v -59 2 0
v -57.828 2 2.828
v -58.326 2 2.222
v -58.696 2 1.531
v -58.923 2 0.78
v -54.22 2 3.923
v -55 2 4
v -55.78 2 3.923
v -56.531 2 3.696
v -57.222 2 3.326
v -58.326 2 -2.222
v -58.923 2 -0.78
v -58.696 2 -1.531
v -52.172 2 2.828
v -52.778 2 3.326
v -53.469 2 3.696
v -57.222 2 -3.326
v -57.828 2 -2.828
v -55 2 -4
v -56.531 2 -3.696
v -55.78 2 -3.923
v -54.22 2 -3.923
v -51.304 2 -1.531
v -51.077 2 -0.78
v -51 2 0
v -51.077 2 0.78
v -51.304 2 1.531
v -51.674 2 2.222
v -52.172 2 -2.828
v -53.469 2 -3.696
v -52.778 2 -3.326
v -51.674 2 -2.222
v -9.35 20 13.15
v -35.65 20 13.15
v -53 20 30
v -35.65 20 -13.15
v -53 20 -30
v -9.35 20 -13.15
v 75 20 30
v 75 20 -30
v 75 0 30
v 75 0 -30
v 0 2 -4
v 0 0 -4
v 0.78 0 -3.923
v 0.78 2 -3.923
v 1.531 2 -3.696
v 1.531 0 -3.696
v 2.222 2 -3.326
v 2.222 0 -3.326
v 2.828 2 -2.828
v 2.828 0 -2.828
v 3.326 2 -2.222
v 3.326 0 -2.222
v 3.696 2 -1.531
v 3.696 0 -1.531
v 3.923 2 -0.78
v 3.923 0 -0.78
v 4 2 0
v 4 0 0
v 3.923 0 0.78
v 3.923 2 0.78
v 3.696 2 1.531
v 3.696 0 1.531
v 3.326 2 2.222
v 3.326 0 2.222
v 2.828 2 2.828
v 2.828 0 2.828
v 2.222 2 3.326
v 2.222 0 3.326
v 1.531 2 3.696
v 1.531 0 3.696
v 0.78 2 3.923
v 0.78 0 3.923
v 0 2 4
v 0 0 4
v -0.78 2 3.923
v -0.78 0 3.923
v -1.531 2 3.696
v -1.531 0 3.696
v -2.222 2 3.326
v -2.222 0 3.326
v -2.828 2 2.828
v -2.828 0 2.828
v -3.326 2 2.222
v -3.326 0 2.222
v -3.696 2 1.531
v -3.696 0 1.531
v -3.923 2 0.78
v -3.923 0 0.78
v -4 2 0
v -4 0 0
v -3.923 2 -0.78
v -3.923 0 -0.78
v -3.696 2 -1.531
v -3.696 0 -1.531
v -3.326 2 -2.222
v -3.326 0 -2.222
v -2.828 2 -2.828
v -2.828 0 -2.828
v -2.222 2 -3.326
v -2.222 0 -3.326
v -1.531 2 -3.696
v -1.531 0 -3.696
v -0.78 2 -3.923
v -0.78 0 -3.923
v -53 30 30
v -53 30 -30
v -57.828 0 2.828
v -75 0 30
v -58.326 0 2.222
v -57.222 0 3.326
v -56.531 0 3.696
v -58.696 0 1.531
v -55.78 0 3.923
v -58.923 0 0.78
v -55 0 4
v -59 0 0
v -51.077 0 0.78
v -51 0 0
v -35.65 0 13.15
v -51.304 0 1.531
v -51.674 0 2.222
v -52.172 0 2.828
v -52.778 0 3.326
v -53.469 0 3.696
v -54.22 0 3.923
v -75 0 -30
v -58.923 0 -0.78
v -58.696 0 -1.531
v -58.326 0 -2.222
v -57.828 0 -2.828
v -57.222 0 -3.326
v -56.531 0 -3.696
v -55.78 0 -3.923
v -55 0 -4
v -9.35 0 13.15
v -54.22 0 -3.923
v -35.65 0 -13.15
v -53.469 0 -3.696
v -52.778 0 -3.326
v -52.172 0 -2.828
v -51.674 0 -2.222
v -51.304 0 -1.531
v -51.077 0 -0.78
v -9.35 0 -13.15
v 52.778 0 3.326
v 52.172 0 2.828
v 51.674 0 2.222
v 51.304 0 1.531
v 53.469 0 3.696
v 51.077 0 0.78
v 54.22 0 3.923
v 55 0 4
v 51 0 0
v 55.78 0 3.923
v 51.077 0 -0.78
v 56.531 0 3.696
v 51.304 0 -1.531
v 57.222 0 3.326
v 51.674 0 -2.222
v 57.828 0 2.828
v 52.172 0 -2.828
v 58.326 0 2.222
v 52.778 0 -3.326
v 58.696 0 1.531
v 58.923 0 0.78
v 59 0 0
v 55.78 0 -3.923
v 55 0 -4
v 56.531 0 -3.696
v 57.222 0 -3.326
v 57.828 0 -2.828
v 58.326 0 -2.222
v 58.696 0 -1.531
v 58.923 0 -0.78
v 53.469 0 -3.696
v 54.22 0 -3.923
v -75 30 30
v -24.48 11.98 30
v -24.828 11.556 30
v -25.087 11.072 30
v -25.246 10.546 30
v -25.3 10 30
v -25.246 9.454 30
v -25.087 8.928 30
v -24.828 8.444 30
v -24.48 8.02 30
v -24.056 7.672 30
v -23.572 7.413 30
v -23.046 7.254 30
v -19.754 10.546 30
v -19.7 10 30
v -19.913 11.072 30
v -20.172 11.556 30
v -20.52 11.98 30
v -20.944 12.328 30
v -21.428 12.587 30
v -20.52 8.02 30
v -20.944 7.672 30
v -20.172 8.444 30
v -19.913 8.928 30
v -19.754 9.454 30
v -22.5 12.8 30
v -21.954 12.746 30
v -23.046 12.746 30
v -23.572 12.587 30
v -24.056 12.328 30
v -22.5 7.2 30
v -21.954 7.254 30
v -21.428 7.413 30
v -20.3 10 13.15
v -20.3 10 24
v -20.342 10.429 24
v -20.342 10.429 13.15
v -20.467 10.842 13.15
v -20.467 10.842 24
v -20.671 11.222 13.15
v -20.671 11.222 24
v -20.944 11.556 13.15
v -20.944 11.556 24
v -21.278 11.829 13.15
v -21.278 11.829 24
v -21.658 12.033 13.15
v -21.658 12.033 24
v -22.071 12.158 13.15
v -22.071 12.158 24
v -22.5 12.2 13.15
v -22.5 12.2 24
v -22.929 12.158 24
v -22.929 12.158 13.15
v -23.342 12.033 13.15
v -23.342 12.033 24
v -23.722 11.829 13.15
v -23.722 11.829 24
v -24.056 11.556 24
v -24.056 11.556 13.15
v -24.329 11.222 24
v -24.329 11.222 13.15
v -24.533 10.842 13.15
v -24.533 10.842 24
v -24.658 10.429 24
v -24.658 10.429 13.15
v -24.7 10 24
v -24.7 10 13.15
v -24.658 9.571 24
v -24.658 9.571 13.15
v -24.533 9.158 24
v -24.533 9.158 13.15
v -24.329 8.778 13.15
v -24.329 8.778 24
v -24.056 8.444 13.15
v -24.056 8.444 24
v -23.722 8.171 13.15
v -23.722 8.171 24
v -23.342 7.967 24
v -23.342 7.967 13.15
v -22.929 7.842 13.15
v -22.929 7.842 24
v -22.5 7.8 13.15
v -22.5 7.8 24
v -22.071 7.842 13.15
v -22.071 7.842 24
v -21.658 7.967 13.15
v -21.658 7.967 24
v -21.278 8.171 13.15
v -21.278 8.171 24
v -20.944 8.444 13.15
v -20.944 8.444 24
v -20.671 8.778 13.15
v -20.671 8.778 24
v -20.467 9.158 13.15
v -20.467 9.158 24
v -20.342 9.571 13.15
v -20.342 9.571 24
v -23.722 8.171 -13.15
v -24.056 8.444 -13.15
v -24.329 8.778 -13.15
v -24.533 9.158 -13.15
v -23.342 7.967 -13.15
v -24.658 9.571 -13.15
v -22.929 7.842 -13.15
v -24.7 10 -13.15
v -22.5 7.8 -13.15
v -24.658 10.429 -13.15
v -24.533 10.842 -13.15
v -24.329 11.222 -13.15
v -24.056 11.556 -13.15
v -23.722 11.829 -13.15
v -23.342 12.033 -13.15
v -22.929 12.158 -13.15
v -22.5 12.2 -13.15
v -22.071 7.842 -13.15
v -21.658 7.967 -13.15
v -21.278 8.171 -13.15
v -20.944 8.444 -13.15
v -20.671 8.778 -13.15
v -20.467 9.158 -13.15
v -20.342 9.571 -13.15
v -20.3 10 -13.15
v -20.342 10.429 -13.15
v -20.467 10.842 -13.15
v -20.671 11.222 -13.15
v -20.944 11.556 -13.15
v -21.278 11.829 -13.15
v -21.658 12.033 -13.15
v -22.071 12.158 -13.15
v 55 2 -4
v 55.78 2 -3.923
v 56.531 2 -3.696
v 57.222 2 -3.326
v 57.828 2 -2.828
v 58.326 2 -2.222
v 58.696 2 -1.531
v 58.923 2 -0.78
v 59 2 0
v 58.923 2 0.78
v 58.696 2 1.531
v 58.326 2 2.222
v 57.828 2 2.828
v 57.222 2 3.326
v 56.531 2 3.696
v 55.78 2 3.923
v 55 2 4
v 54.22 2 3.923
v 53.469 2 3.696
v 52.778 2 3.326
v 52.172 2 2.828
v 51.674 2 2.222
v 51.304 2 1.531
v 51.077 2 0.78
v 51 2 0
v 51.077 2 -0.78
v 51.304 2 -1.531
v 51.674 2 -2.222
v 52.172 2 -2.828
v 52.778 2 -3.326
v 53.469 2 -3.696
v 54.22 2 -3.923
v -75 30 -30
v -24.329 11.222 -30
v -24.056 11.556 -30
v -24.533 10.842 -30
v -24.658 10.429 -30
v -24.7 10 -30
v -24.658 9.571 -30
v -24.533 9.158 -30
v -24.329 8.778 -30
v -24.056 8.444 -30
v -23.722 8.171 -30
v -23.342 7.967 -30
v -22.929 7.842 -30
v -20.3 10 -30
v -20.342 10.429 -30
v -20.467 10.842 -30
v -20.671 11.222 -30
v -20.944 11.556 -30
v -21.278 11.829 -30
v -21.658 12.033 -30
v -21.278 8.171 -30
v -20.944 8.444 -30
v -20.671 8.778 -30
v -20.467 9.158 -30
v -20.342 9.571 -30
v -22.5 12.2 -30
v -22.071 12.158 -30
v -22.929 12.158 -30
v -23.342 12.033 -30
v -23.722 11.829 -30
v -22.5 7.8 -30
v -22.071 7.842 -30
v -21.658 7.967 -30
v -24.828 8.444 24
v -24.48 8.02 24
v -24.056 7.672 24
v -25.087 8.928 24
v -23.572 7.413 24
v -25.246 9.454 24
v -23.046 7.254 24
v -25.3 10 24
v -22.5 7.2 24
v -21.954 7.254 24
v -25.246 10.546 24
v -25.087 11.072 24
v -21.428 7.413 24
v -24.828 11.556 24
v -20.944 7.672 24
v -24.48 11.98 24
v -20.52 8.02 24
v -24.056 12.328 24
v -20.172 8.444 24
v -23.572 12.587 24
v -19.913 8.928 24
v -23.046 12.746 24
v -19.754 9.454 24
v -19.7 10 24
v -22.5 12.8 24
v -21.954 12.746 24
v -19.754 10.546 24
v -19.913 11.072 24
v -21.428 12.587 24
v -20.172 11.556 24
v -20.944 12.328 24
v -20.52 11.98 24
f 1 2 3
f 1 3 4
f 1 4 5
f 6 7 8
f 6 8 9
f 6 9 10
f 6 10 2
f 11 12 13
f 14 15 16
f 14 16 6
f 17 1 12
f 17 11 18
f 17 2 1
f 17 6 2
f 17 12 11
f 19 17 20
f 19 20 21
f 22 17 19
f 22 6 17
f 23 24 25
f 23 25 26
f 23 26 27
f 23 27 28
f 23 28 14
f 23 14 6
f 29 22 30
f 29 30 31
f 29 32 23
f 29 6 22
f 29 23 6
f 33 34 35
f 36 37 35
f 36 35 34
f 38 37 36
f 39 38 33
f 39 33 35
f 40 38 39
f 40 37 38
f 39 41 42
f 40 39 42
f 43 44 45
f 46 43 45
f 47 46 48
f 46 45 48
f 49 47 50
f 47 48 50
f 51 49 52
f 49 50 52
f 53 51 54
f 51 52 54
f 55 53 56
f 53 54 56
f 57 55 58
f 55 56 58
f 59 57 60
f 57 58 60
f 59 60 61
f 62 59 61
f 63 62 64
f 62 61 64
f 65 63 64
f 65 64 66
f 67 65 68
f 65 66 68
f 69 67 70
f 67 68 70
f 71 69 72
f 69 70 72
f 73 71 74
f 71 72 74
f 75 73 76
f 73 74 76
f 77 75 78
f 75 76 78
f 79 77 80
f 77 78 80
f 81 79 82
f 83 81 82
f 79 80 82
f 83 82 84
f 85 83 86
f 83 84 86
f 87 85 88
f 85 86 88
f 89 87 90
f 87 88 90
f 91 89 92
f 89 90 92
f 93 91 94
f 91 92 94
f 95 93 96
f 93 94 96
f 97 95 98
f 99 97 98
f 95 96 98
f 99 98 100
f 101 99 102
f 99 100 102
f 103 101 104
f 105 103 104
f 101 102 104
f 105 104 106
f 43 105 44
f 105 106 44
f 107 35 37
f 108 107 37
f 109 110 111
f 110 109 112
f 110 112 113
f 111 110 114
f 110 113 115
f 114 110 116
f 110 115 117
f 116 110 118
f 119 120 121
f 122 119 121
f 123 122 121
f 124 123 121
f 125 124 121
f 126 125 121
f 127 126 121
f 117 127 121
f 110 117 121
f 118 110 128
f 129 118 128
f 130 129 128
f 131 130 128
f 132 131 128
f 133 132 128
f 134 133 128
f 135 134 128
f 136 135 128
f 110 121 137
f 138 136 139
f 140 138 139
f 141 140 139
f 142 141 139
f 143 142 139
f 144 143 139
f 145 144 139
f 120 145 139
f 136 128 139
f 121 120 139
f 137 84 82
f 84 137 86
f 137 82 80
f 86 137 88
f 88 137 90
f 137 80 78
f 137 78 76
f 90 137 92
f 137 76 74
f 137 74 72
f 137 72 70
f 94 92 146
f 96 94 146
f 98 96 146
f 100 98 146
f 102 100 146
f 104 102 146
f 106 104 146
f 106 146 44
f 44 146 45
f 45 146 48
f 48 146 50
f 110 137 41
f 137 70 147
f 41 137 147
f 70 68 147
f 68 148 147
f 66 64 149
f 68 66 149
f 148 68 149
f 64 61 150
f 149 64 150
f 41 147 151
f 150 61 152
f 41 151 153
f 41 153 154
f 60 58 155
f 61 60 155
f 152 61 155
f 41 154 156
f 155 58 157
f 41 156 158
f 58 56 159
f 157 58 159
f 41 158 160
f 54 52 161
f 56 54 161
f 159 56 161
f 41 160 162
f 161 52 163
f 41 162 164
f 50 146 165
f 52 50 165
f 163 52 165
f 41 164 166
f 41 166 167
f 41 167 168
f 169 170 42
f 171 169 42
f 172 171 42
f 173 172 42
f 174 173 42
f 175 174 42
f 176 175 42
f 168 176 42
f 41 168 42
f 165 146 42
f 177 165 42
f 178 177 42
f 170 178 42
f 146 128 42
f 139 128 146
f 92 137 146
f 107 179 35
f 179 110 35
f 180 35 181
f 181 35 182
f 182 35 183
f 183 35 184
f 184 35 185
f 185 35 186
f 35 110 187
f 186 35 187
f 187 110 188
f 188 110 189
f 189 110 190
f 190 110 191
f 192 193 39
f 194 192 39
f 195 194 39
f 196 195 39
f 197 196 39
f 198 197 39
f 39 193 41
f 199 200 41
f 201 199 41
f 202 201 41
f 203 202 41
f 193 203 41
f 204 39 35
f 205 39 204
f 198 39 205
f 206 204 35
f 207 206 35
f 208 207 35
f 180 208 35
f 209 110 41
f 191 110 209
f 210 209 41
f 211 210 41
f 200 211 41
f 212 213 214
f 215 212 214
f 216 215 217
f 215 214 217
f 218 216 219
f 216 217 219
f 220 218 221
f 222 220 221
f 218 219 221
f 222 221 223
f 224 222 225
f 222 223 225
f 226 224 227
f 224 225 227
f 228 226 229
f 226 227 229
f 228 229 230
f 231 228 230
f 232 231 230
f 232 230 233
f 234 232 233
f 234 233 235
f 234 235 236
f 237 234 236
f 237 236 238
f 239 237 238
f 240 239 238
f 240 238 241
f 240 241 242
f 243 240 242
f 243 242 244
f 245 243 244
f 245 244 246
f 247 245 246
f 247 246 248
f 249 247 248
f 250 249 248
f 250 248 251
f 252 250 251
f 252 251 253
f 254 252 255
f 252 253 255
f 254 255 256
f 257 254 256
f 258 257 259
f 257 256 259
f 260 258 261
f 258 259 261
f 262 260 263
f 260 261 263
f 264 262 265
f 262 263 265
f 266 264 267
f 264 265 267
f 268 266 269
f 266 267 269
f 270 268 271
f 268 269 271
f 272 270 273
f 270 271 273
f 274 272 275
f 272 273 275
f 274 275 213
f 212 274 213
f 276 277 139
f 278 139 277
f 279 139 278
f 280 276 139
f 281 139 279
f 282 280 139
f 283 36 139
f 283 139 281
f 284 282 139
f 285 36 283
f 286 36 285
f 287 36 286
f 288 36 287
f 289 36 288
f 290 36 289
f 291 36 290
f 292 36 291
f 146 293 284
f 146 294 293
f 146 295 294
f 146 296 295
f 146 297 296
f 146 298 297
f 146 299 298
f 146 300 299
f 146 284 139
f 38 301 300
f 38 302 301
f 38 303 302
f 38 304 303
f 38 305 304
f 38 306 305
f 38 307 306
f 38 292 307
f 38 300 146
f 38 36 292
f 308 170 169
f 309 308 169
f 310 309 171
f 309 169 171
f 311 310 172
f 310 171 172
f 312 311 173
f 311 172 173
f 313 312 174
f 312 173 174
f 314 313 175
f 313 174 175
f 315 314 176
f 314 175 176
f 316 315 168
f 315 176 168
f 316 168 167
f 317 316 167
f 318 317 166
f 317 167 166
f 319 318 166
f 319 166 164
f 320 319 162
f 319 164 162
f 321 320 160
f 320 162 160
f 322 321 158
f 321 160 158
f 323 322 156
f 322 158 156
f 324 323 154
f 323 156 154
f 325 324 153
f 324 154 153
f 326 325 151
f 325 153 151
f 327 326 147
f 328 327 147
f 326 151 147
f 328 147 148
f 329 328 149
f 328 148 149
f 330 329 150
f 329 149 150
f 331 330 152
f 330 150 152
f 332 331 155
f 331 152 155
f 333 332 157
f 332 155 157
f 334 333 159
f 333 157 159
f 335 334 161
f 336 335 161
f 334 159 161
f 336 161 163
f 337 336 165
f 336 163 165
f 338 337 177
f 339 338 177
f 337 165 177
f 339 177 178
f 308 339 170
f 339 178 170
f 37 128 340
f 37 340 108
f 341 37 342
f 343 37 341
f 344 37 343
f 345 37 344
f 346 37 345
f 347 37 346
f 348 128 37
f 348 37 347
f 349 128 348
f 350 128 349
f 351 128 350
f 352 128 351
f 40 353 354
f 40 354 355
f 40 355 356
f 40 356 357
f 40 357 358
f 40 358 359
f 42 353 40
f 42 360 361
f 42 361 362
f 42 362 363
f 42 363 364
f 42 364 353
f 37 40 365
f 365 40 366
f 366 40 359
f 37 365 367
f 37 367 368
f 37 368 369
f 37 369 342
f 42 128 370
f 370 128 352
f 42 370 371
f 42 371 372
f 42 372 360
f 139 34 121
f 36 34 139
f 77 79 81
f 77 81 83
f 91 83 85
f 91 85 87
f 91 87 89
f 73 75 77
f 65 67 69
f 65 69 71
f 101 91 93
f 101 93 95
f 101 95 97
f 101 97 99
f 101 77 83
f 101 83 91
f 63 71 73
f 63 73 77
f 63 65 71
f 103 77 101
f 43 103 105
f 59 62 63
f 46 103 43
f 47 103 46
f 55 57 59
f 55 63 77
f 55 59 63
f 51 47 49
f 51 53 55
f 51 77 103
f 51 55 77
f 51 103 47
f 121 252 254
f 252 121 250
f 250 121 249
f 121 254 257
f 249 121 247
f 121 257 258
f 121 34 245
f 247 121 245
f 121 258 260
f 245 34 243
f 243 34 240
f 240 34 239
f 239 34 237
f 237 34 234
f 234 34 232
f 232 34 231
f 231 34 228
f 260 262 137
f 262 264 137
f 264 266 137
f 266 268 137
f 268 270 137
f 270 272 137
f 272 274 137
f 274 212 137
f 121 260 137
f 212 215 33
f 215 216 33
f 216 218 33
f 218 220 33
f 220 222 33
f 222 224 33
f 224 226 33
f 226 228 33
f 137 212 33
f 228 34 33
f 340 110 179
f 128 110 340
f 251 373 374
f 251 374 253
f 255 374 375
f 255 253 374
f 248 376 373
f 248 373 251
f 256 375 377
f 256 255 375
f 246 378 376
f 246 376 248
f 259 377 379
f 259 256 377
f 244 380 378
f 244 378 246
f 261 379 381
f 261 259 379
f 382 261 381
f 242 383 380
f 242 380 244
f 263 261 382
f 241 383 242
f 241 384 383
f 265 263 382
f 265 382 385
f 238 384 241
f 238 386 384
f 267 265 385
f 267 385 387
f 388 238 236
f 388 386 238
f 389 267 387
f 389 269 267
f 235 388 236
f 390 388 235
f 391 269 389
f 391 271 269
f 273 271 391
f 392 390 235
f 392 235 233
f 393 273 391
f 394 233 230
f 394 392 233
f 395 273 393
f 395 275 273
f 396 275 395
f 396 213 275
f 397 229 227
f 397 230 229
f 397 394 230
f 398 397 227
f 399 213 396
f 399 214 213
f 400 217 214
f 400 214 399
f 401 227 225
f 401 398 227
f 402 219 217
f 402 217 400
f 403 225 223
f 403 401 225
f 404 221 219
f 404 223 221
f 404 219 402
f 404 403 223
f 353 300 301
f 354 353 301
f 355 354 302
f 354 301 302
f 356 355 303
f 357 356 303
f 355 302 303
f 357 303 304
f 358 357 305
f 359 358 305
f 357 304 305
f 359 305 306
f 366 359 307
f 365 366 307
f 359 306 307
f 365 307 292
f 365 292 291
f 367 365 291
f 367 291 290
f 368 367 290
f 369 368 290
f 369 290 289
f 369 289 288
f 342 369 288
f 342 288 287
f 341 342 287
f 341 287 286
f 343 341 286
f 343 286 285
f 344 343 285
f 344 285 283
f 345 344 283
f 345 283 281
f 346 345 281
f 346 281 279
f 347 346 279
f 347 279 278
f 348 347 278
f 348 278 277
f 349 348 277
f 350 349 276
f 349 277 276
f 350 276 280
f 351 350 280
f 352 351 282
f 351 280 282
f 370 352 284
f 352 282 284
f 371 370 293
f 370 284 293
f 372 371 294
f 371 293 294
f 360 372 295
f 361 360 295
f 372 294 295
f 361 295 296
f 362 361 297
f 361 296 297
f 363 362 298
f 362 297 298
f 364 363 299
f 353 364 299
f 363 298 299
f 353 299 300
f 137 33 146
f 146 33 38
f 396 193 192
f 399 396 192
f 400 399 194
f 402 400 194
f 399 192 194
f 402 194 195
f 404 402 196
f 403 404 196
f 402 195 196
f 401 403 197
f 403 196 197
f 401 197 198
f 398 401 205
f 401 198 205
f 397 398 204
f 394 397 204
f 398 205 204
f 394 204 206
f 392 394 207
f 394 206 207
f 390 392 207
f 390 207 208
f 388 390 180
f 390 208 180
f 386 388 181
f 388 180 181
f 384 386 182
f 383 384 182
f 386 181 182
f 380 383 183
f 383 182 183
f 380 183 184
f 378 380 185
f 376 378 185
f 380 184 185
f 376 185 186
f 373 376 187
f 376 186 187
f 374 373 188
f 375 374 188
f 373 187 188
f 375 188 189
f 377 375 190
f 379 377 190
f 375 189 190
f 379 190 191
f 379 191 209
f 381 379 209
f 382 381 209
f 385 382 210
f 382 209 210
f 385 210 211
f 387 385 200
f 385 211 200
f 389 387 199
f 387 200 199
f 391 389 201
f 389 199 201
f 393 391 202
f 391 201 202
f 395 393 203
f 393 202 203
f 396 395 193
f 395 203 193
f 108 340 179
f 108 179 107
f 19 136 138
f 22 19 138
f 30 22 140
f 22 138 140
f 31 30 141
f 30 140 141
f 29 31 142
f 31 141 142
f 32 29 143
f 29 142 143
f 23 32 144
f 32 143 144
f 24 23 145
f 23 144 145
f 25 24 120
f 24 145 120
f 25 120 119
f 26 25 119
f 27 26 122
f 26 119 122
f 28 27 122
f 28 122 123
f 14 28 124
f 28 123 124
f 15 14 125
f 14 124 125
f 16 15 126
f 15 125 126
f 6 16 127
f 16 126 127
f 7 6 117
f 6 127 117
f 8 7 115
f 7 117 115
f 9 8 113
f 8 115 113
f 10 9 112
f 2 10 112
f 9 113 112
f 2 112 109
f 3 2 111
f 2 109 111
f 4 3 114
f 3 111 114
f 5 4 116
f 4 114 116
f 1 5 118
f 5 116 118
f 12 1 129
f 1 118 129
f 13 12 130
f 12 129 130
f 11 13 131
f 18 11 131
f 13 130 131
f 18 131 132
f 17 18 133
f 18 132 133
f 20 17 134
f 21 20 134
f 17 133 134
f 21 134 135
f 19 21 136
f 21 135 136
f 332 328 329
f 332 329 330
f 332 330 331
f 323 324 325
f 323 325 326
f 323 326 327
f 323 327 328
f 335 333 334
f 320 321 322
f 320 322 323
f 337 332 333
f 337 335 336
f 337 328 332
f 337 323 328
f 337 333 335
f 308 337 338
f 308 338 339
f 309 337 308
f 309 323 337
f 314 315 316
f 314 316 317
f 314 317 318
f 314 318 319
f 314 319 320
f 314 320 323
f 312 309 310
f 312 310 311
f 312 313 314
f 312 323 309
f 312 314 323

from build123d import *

# Parameters (mm, degrees)
SKETCH1_W           = 150
SKETCH1_H           = 60
BOSS_EXTRUDE1_DEPTH = 20
SKETCH2_W           = 22
SKETCH2_H           = 60
BOSS_EXTRUDE2_DEPTH = 10
SKETCH3_W           = 26.3
SKETCH3_H           = 26.3
CUT_EXTRUDE1_DEPTH  = 84.216584885
SKETCH4_R           = 2.2
CUT_EXTRUDE2_DEPTH  = 101.623058987
SKETCH5_R           = 2.8
CUT_EXTRUDE3_DEPTH  = 6
SKETCH6_R           = 4
CUT_EXTRUDE4_DEPTH  = 2


with BuildPart() as part:
    # Sketch1 → Boss-Extrude1 (new body)
    with BuildSketch(Plane(origin=(0, 0, 0), x_dir=(1, 0, 0), z_dir=(0, 1, 0))):
        Rectangle(SKETCH1_W, SKETCH1_H)
    extrude(amount=BOSS_EXTRUDE1_DEPTH)

    # Sketch2 → Boss-Extrude2 (add)
    with BuildSketch(Plane(origin=(0, 20, 0), x_dir=(1, 0, 0), z_dir=(0, 1, 0))):
        with Locations((-64, 0)):
            Rectangle(SKETCH2_W, SKETCH2_H)
    extrude(amount=BOSS_EXTRUDE2_DEPTH)

    # Sketch3 → Cut-Extrude1 (cut, through all)
    with BuildSketch(Plane(origin=(0, 20, 0), x_dir=(1, 0, 0), z_dir=(0, 1, 0))):
        with Locations((-22.5, 0)):
            Rectangle(SKETCH3_W, SKETCH3_H)
    extrude(amount=-CUT_EXTRUDE1_DEPTH, mode=Mode.SUBTRACT)

    # Sketch4 → Cut-Extrude2 (cut, through all)
    with BuildSketch(Plane.XY.offset(30)):
        with Locations((-22.5, 10)):
            Circle(SKETCH4_R)
    extrude(amount=-CUT_EXTRUDE2_DEPTH, mode=Mode.SUBTRACT)

    # Sketch5 → Cut-Extrude3 (cut)
    with BuildSketch(Plane.XY.offset(30)):
        with Locations((-22.5, 10)):
            Circle(SKETCH5_R)
    extrude(amount=-CUT_EXTRUDE3_DEPTH, mode=Mode.SUBTRACT)

    # Sketch6 → Cut-Extrude4 (cut)
    with BuildSketch(Plane(origin=(0, 0, 0), x_dir=(-1, 0, 0), z_dir=(0, -1, 0))):
        with Locations(Location((0, 0, 0), (0, 0, 90))):
            Circle(SKETCH6_R)
        with Locations(Location((-55, 0, 0), (0, 0, 90))):
            Circle(SKETCH6_R)
        with Locations(Location((55, 0, 0), (0, 0, 90))):
            Circle(SKETCH6_R)
    extrude(amount=-CUT_EXTRUDE4_DEPTH, mode=Mode.SUBTRACT)


solid = part.part
